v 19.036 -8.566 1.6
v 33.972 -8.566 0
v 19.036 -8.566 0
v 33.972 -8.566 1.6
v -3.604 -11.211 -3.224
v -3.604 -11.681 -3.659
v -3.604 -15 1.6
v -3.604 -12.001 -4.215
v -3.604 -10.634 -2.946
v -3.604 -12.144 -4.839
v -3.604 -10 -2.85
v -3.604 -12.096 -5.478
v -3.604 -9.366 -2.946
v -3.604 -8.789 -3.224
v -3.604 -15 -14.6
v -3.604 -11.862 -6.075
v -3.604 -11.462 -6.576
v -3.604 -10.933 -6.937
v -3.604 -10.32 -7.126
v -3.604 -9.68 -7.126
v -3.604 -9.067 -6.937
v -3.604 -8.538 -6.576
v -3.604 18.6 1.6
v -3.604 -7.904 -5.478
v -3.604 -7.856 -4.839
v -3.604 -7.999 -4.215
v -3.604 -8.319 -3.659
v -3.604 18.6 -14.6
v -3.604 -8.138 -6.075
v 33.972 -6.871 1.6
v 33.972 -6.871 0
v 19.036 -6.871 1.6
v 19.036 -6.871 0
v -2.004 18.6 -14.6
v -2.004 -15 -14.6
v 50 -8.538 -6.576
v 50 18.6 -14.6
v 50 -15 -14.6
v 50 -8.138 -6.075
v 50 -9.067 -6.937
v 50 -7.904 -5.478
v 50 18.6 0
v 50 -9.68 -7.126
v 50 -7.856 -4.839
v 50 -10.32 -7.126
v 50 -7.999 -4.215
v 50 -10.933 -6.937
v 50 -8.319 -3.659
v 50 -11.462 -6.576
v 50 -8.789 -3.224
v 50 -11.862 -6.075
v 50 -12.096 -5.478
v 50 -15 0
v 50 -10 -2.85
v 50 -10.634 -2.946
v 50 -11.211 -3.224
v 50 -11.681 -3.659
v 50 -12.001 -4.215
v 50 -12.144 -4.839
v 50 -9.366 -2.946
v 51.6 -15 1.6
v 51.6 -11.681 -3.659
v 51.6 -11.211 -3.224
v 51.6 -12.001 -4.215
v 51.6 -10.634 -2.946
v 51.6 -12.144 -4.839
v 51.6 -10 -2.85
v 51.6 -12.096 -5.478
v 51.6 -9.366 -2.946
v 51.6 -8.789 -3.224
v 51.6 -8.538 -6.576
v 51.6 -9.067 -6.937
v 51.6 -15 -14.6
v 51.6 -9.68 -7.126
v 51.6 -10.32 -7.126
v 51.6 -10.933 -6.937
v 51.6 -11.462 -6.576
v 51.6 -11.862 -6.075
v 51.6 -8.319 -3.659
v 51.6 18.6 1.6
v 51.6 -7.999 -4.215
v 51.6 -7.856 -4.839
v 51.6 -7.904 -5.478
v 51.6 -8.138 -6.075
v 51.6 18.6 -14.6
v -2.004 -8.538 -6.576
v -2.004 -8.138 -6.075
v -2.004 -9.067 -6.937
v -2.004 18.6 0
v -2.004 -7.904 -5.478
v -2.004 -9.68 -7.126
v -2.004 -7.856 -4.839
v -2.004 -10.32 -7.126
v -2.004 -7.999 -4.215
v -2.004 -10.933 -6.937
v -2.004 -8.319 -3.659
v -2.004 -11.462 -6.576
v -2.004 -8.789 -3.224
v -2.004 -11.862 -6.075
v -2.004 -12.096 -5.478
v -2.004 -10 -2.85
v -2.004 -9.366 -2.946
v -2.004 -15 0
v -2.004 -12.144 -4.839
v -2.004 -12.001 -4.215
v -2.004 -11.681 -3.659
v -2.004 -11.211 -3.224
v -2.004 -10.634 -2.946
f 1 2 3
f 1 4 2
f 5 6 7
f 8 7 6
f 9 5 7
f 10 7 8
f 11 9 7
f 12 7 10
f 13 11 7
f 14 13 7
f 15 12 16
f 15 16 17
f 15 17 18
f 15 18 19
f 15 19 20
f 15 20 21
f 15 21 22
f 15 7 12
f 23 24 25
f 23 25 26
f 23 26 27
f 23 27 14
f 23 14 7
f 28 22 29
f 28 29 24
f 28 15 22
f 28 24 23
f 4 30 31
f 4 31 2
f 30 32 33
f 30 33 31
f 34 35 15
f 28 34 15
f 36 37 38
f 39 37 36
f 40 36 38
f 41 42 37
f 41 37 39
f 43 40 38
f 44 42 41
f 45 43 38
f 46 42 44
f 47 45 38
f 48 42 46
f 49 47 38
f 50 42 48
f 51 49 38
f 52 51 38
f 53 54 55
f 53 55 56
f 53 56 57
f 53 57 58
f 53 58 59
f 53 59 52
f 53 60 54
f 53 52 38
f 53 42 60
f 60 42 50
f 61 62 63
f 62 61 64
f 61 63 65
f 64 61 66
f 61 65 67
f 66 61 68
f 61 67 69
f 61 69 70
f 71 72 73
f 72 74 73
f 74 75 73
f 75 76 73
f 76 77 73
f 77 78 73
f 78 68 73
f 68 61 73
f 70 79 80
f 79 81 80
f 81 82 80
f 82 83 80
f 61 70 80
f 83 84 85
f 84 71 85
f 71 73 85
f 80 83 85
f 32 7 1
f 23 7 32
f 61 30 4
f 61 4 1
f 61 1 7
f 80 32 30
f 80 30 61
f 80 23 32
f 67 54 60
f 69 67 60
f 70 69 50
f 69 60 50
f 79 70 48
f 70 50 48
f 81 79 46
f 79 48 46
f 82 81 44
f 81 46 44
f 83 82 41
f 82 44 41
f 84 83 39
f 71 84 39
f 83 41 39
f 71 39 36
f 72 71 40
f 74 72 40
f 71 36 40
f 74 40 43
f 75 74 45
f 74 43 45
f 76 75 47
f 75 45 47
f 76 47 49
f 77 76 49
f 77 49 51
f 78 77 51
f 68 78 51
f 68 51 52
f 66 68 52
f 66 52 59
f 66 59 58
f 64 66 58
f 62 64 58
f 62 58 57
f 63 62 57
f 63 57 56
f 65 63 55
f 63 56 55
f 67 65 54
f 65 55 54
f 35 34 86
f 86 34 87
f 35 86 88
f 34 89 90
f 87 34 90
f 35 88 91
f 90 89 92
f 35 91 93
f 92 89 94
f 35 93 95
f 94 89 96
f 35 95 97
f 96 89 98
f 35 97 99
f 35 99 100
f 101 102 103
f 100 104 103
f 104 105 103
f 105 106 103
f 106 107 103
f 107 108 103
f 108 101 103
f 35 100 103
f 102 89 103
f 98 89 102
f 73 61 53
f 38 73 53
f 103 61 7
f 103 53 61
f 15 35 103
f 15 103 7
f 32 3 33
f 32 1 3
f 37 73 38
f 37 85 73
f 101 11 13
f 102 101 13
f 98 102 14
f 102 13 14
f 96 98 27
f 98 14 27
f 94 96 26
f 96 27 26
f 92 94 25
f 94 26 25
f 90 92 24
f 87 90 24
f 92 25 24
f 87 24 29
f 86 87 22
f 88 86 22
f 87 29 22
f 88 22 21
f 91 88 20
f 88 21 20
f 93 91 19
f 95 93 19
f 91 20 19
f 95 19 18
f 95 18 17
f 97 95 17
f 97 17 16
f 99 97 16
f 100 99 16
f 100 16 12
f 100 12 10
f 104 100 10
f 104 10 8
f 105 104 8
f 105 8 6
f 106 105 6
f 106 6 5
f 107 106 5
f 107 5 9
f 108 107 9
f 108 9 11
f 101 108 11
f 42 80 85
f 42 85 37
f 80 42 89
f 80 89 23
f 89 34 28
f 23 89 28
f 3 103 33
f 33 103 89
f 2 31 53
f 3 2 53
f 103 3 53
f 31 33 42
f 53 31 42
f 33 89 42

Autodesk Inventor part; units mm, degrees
ref_plane "YZ Plane" through (0, 0, 0) normal (1, 0, 0) x (0, 1, 0)
ref_plane "XZ Plane" through (0, 0, 0) normal (0, 1, 0) x (-1, 0, 0)
ref_plane "XY Plane" through (0, 0, 0) normal (0, 0, 1) x (1, 0, 0)
sketch "Sketch1" plane through (0, 0, 0) normal (0, 0, 1) x (1, 0, 0)
  line L0 (0, 0) -> (-1.6043, 0)
  line L1 (-1.6043, 0) -> (-2.0043, 0)
  line L2 (-2.0043, 0) -> (-3.6043, 0)
  line L3 (0, 0) -> (0, -15)
  line L4 (0, -15) -> (-3.6043, -15)
  line L5 (-3.6043, -15) -> (-3.6043, 0)
  line L6 (0, 0) -> (0, 18.6)
  line L7 (0, 18.6) -> (-3.6043, 18.6)
  line L8 (-3.6043, 18.6) -> (-3.6043, 0)
  line L9 (-2.0043, 0) -> (-2.0043, -15)
  line L10 (-2.0043, 0.2824) -> (-2.0043, 18.6)
  line L11 (0, -15) -> (49.6, -15)
  line L12 (49.6, -15) -> (50, -15)
  line L13 (50, -15) -> (51.6, -15)
  line L14 (51.6, -15) -> (51.6, 18.6)
  line L15 (51.6, 18.6) -> (50, 18.6)
  line L16 (50, 18.6) -> (50, -15)
  line L17 (50, 18.6) -> (-2.0043, 18.6)
  dimension "d0" = 0.4
  dimension "d1" = 1.6
  dimension "d2" = 15
  dimension "d4" = 49.6
  dimension "d5" = 0.4
  dimension "d6" = 1.6
extrude "Extrusion1" add sketch "Sketch1" along normal blind 1.6
sketch "Sketch2" plane through (0, 0, 0) normal (0, 0, -1) x (-1, 0, 0)
  line L0 (3.6043, 18.6) -> (3.6043, -15) projected
  line L1 (3.6043, 18.6) -> (2.0043, 18.6)
  line L2 (-51.6, 18.6) -> (3.6043, 18.6) projected
  line L3 (2.0043, 18.6) -> (2.0043, -15)
  line L4 (3.6043, -15) -> (-51.6, -15) projected
  line L5 (-51.6, -15) -> (-51.6, 18.6) projected
  line L6 (-51.6, 18.6) -> (-50, 18.6)
  line L7 (-50, 18.6) -> (-50, -15)
  line L8 (-51.6, 18.6) -> (-50, 18.6)
  line L9 (-51.6, -15) -> (-50, -15)
  line L10 (2.0043, 18.6) -> (3.6043, 18.6)
  line L11 (3.6043, -15) -> (2.0043, -15)
  point P0 (0, 0)
  dimension "d9" = 1.6
  dimension "d10" = 1.6
extrude "Extrusion2" add sketch "Sketch2" along normal blind 14.6 contours L0 L4 L3 L1 | L7 L4 L5 L2
sketch "Sketch3" plane through (-3.6043, -15, 1.6) normal (-1, 0, 0) x (0, 0, 1)
  line L0 (-16.2, 0) -> (0, 0) projected
  line L1 (0, 0) -> (0, 5)
  line L2 (0, 33.6) -> (0, 0) projected
  line L3 (0, 0) -> (-6.6, 0)
  line L4 (-1.6, 0) -> (-16.2, 0) projected
  line L5 (-6.6, 0) -> (-6.6, 5)
  circle A0 centre (-6.6, 5) radius 2.15
  point P0 (-1.6, 15)
  dimension "d13" = 5
  dimension "d14" = 6.6
  dimension "d15" = 4.3
extrude "Extrusion3" cut sketch "Sketch3" against normal blind 68.6
sketch "Sketch4" plane through (0, 0, 1.6) normal (0, 0, 1) x (1, 0, 0)
  line L0 (19.036, -6.8706) -> (33.9718, -6.8706)
  line L1 (33.9718, -6.8706) -> (33.9718, -8.566)
  line L2 (33.9718, -8.566) -> (19.036, -8.566)
  line L3 (19.036, -8.566) -> (19.036, -6.8706)
  point P0 (0, 0)
extrude "Extrusion4" cut sketch "Sketch4" against normal blind 68.6
